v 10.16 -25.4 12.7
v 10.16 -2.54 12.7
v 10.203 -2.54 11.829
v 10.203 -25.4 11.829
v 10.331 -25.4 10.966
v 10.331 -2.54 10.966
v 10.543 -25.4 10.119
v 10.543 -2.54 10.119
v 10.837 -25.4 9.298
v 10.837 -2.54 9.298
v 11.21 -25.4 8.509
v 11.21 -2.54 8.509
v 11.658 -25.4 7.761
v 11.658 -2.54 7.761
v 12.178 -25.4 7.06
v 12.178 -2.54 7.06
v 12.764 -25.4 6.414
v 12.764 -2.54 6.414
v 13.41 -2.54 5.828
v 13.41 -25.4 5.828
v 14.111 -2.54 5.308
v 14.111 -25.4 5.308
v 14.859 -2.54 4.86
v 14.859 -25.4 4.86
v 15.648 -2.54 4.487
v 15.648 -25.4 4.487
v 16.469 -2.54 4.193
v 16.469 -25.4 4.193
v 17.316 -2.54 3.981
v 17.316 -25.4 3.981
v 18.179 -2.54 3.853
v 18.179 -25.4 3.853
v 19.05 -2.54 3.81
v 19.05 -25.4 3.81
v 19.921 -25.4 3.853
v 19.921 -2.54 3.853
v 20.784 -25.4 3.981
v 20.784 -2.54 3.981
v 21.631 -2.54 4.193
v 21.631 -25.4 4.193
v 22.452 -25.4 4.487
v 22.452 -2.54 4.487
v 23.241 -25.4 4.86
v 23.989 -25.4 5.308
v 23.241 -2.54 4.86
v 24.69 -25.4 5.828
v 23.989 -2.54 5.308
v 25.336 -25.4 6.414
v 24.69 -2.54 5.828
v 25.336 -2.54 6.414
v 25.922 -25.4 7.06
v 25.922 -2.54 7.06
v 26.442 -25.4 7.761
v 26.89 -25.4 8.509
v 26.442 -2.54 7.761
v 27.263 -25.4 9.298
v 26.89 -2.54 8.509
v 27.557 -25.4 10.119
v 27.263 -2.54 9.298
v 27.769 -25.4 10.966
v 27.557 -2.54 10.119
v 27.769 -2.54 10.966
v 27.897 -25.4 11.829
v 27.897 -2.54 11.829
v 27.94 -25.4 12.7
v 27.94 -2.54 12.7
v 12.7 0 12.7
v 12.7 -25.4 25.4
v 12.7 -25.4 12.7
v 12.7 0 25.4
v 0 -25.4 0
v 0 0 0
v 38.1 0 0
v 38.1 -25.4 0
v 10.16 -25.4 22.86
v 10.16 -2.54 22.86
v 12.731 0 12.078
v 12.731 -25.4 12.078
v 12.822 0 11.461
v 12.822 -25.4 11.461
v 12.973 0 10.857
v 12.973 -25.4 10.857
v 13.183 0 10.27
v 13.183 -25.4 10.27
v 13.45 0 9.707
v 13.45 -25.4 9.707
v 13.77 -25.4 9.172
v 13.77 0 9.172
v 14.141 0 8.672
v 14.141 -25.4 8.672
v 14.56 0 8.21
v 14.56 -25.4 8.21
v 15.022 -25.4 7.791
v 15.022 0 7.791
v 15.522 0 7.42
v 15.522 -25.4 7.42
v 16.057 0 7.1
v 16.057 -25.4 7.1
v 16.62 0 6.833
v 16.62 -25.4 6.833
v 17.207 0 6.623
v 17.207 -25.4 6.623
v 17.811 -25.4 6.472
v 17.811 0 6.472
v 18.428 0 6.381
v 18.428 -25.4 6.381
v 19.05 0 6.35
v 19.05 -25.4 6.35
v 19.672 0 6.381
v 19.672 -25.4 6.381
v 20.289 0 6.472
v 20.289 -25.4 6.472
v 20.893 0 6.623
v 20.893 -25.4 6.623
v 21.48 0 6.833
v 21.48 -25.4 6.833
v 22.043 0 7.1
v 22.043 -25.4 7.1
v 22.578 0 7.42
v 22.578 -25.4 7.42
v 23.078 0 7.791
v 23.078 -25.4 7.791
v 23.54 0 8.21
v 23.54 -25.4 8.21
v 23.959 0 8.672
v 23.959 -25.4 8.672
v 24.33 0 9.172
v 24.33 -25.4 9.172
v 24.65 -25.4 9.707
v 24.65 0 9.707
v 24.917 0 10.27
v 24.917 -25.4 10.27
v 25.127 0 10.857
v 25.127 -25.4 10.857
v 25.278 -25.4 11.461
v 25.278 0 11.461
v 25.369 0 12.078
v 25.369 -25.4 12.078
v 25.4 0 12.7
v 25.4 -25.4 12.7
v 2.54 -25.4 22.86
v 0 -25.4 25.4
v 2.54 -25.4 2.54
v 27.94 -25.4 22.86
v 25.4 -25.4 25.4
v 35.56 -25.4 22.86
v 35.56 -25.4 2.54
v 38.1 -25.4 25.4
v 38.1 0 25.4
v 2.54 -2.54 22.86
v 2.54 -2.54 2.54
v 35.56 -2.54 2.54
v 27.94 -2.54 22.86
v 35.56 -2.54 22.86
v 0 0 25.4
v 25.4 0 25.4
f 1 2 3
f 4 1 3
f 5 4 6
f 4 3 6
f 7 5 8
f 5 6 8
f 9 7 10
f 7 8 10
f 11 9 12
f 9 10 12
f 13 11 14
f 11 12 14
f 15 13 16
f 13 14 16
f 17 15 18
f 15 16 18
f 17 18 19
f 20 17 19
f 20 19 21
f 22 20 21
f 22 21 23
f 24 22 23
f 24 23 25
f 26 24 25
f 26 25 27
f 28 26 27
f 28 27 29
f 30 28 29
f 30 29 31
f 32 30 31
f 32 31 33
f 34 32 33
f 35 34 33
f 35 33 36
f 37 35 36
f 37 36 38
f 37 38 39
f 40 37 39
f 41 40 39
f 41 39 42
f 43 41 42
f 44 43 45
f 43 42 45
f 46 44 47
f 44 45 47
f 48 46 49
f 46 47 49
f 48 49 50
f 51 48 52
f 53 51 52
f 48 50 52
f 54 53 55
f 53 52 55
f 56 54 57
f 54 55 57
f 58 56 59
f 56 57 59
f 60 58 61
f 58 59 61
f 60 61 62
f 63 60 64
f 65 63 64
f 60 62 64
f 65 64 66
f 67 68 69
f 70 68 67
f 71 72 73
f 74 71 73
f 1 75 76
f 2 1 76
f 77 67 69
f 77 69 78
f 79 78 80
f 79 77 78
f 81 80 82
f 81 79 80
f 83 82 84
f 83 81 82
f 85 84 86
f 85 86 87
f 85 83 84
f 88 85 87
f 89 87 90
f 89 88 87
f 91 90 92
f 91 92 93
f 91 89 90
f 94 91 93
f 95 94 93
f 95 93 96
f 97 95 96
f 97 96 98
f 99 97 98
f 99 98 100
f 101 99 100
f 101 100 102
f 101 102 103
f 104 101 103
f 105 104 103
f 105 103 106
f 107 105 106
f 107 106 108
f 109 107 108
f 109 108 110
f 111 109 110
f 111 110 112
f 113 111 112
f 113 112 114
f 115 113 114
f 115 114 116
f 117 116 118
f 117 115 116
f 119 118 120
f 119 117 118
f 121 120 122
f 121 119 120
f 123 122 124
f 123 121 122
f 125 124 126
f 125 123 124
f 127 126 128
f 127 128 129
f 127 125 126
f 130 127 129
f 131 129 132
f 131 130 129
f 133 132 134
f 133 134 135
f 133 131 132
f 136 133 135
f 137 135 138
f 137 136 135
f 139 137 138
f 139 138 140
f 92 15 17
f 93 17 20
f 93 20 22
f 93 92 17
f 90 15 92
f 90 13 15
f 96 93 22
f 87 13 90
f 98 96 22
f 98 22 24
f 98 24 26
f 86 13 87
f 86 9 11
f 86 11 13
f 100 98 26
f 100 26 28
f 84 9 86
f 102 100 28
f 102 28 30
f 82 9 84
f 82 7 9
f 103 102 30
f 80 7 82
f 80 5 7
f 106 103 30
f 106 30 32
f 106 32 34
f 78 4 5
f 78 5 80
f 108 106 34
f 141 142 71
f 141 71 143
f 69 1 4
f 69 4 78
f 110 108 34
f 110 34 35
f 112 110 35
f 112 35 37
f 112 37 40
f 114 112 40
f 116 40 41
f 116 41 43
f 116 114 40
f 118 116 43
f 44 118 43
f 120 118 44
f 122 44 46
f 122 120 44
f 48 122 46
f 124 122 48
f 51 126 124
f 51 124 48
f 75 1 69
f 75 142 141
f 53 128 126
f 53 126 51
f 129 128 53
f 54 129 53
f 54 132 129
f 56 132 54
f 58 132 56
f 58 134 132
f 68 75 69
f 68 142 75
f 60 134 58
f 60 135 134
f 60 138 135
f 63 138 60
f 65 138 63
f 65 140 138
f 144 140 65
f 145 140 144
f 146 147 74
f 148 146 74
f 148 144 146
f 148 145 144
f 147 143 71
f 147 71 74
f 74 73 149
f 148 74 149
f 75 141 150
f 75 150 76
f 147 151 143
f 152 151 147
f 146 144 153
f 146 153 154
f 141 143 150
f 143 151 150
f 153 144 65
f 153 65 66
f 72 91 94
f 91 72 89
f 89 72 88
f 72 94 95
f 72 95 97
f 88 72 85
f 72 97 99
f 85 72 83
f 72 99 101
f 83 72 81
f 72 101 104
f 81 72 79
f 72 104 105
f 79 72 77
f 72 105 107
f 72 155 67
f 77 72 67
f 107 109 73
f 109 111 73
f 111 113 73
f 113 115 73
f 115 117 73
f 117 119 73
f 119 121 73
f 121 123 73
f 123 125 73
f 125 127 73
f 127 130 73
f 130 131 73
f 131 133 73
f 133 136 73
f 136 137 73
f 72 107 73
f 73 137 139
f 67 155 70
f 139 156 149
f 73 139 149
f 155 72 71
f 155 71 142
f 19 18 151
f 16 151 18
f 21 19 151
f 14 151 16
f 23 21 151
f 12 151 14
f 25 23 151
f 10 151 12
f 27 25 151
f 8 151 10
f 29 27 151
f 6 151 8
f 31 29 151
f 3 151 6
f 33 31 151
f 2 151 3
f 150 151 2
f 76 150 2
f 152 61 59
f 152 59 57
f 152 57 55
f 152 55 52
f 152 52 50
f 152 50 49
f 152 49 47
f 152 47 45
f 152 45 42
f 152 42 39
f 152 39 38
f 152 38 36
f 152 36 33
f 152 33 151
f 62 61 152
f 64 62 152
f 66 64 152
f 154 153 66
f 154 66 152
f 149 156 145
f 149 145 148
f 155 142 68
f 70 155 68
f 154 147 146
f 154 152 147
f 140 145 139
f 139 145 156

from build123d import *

# Parameters (mm, degrees)
F0_W     = 38.1
F0_H     = 25.4
F0_R     = 6.35
F1_DEPTH = 25.4
F2_W     = 12.7
F2_H     = 25.4
F3_DEPTH = 12.7
F4_T     = -2.54


with BuildPart() as f1:
    # F0 (on Front) → F1 (new body)
    with BuildSketch(Plane.XZ):
        with Locations((19.05, 12.7)):
            Rectangle(F0_W, F0_H)
        with Locations((19.05, 12.7)):
            Circle(F0_R, mode=Mode.SUBTRACT)
    extrude(amount=F1_DEPTH)

    # F2 (on face) → F3 (cut)
    with BuildSketch(Plane.XY.offset(25.4)):
        with Locations((19.05, -12.7)):
            Rectangle(F2_W, F2_H)
    extrude(amount=-F3_DEPTH, mode=Mode.SUBTRACT)

    # F4
    f4_openings = [f1.faces().sort_by_distance(p)[0] for p in [
        (6.35, -25.4, 24.942095),
    ]]
    offset(amount=F4_T, openings=f4_openings)


solid = f1.part
